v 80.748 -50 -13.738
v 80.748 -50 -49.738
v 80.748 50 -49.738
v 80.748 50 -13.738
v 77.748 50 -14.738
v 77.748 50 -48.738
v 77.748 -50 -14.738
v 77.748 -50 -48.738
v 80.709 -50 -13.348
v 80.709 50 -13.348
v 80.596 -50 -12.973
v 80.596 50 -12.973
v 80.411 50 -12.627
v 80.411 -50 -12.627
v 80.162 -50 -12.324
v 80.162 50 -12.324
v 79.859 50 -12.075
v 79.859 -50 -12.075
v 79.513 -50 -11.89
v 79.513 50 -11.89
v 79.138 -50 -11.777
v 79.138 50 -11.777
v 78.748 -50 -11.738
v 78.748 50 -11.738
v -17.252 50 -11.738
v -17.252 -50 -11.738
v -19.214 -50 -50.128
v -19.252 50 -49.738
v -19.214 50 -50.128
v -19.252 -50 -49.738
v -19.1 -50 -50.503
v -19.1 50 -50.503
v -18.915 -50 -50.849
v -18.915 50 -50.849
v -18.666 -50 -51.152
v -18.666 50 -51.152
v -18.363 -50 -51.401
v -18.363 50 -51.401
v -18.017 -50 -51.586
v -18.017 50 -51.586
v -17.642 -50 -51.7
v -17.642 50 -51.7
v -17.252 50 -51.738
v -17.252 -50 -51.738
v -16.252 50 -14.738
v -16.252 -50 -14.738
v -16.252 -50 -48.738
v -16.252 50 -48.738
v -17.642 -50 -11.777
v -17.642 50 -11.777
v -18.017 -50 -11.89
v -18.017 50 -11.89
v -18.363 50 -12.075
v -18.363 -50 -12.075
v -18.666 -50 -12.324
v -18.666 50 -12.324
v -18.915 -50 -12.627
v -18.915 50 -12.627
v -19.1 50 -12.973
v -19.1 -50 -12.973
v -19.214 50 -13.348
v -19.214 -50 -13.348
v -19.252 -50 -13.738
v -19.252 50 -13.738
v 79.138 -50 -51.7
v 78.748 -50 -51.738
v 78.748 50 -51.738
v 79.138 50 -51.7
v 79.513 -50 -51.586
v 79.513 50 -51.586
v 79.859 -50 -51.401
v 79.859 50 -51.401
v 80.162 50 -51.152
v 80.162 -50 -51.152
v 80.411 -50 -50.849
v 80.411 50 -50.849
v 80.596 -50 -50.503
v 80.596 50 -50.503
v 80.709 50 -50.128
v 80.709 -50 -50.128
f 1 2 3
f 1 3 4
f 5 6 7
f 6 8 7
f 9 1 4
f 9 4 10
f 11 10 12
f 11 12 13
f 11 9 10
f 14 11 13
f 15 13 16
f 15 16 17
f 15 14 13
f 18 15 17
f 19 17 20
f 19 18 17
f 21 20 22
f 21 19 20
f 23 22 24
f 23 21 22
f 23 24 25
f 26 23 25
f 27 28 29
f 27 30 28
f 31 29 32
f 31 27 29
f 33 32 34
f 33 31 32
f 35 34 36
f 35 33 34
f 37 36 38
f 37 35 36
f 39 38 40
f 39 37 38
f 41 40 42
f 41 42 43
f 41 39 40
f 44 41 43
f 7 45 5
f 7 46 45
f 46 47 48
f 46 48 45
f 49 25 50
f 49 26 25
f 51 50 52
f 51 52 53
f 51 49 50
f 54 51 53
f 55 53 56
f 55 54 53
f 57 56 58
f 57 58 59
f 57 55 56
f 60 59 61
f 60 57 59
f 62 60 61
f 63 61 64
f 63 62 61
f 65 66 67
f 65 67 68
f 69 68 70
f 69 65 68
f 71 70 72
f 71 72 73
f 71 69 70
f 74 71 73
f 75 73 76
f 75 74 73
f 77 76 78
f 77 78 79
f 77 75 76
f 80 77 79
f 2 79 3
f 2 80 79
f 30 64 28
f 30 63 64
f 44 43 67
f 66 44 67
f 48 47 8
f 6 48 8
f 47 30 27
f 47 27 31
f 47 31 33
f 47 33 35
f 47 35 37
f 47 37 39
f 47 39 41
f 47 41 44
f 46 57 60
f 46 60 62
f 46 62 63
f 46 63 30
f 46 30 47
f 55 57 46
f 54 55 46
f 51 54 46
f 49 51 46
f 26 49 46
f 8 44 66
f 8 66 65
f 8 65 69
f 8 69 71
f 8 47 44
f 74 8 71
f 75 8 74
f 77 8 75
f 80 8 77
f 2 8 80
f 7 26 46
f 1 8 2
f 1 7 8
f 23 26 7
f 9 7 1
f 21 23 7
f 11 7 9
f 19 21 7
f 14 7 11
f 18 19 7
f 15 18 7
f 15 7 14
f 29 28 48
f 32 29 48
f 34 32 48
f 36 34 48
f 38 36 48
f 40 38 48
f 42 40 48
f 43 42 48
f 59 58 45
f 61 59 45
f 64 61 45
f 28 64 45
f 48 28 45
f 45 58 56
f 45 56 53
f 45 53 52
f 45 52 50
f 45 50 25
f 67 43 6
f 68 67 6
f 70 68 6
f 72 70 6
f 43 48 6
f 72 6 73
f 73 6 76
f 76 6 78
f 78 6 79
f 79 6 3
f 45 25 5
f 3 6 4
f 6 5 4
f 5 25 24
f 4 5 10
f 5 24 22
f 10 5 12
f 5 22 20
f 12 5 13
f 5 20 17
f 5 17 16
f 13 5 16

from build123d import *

# Parameters (mm, degrees)
F3_W     = 94
F3_H     = 34
F4_DEPTH = 50


with BuildPart() as f4:
    # F3 (on Front) → F4 (new body, symmetric)
    with BuildSketch(Plane.XZ):
        with BuildLine():
            ThreePointArc((-19.2521204937, -49.7380952381), (-18.6663340561, -51.1523088005), (-17.2521204937, -51.7380952381))
            Line((-17.2521204937, -51.7380952381), (78.7478795063, -51.7380952381))
            ThreePointArc((78.7478795063, -51.7380952381), (80.1620930687, -51.1523088005), (80.7478795063, -49.7380952381))
            Line((80.7478795063, -49.7380952381), (80.7478795063, -13.7380952381))
            ThreePointArc((80.7478795063, -13.7380952381), (80.1620930687, -12.3238816757), (78.7478795063, -11.7380952381))
            Line((78.7478795063, -11.7380952381), (-17.2521204937, -11.7380952381))
            ThreePointArc((-17.2521204937, -11.7380952381), (-18.6663340561, -12.3238816757), (-19.2521204937, -13.7380952381))
            Line((-19.2521204937, -13.7380952381), (-19.2521204937, -49.7380952381))
        make_face()
        with Locations((30.7478795063, -31.7380952381)):
            Rectangle(F3_W, F3_H, mode=Mode.SUBTRACT)
    extrude(amount=F4_DEPTH, both=True)


with BuildPart() as f5_1:
    # F5: copy of F4
    add(f4.part)


solid = f4.part
